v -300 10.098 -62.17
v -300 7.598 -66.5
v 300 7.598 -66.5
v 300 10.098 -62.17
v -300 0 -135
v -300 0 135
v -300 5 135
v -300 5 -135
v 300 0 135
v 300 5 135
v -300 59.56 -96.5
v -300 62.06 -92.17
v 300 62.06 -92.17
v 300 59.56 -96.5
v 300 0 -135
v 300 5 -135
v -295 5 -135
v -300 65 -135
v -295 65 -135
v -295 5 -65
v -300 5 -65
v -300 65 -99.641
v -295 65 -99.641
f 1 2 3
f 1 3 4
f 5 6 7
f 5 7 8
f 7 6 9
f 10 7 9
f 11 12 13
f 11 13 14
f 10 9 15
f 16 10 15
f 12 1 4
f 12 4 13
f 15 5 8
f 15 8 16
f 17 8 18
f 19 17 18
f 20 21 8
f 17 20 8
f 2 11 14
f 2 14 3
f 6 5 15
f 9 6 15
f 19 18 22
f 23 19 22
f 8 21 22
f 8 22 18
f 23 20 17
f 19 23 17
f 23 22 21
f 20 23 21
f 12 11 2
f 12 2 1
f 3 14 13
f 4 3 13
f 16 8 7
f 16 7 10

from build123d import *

# Parameters (mm, degrees)
SKETCH1_W           = 600
SKETCH1_H           = 270
BOSS_EXTRUDE1_DEPTH = 5
BOSS_EXTRUDE2_DEPTH = 5
BOSS_EXTRUDE4_DEPTH = 600


with BuildPart() as part:
    # Sketch1 → Boss-Extrude1 (new body)
    with BuildSketch(Plane(origin=(0, 0, 0), x_dir=(1, 0, 0), z_dir=(0, 1, 0))):
        Rectangle(SKETCH1_W, SKETCH1_H)
    extrude(amount=BOSS_EXTRUDE1_DEPTH)


with BuildPart() as body_2:
    # Sketch2 → Boss-Extrude2 (new body)
    with BuildSketch(Plane.ZY.offset(300)):
        Polygon((-99.641016151, 65), (-65, 5), (-135, 5), (-135, 65), align=None)
    extrude(amount=-BOSS_EXTRUDE2_DEPTH)


with BuildPart() as body_3:
    # Sketch3 → Boss-Extrude4 (new body)
    with BuildSketch(Plane.ZY.offset(300)):
        Polygon((-96.5, 59.559600438), (-66.5, 7.598076211), (-62.169872981, 10.098076211), (-92.169872981, 62.059600438), align=None)
    extrude(amount=-BOSS_EXTRUDE4_DEPTH)


solid = Compound([part.part, body_2.part, body_3.part])
